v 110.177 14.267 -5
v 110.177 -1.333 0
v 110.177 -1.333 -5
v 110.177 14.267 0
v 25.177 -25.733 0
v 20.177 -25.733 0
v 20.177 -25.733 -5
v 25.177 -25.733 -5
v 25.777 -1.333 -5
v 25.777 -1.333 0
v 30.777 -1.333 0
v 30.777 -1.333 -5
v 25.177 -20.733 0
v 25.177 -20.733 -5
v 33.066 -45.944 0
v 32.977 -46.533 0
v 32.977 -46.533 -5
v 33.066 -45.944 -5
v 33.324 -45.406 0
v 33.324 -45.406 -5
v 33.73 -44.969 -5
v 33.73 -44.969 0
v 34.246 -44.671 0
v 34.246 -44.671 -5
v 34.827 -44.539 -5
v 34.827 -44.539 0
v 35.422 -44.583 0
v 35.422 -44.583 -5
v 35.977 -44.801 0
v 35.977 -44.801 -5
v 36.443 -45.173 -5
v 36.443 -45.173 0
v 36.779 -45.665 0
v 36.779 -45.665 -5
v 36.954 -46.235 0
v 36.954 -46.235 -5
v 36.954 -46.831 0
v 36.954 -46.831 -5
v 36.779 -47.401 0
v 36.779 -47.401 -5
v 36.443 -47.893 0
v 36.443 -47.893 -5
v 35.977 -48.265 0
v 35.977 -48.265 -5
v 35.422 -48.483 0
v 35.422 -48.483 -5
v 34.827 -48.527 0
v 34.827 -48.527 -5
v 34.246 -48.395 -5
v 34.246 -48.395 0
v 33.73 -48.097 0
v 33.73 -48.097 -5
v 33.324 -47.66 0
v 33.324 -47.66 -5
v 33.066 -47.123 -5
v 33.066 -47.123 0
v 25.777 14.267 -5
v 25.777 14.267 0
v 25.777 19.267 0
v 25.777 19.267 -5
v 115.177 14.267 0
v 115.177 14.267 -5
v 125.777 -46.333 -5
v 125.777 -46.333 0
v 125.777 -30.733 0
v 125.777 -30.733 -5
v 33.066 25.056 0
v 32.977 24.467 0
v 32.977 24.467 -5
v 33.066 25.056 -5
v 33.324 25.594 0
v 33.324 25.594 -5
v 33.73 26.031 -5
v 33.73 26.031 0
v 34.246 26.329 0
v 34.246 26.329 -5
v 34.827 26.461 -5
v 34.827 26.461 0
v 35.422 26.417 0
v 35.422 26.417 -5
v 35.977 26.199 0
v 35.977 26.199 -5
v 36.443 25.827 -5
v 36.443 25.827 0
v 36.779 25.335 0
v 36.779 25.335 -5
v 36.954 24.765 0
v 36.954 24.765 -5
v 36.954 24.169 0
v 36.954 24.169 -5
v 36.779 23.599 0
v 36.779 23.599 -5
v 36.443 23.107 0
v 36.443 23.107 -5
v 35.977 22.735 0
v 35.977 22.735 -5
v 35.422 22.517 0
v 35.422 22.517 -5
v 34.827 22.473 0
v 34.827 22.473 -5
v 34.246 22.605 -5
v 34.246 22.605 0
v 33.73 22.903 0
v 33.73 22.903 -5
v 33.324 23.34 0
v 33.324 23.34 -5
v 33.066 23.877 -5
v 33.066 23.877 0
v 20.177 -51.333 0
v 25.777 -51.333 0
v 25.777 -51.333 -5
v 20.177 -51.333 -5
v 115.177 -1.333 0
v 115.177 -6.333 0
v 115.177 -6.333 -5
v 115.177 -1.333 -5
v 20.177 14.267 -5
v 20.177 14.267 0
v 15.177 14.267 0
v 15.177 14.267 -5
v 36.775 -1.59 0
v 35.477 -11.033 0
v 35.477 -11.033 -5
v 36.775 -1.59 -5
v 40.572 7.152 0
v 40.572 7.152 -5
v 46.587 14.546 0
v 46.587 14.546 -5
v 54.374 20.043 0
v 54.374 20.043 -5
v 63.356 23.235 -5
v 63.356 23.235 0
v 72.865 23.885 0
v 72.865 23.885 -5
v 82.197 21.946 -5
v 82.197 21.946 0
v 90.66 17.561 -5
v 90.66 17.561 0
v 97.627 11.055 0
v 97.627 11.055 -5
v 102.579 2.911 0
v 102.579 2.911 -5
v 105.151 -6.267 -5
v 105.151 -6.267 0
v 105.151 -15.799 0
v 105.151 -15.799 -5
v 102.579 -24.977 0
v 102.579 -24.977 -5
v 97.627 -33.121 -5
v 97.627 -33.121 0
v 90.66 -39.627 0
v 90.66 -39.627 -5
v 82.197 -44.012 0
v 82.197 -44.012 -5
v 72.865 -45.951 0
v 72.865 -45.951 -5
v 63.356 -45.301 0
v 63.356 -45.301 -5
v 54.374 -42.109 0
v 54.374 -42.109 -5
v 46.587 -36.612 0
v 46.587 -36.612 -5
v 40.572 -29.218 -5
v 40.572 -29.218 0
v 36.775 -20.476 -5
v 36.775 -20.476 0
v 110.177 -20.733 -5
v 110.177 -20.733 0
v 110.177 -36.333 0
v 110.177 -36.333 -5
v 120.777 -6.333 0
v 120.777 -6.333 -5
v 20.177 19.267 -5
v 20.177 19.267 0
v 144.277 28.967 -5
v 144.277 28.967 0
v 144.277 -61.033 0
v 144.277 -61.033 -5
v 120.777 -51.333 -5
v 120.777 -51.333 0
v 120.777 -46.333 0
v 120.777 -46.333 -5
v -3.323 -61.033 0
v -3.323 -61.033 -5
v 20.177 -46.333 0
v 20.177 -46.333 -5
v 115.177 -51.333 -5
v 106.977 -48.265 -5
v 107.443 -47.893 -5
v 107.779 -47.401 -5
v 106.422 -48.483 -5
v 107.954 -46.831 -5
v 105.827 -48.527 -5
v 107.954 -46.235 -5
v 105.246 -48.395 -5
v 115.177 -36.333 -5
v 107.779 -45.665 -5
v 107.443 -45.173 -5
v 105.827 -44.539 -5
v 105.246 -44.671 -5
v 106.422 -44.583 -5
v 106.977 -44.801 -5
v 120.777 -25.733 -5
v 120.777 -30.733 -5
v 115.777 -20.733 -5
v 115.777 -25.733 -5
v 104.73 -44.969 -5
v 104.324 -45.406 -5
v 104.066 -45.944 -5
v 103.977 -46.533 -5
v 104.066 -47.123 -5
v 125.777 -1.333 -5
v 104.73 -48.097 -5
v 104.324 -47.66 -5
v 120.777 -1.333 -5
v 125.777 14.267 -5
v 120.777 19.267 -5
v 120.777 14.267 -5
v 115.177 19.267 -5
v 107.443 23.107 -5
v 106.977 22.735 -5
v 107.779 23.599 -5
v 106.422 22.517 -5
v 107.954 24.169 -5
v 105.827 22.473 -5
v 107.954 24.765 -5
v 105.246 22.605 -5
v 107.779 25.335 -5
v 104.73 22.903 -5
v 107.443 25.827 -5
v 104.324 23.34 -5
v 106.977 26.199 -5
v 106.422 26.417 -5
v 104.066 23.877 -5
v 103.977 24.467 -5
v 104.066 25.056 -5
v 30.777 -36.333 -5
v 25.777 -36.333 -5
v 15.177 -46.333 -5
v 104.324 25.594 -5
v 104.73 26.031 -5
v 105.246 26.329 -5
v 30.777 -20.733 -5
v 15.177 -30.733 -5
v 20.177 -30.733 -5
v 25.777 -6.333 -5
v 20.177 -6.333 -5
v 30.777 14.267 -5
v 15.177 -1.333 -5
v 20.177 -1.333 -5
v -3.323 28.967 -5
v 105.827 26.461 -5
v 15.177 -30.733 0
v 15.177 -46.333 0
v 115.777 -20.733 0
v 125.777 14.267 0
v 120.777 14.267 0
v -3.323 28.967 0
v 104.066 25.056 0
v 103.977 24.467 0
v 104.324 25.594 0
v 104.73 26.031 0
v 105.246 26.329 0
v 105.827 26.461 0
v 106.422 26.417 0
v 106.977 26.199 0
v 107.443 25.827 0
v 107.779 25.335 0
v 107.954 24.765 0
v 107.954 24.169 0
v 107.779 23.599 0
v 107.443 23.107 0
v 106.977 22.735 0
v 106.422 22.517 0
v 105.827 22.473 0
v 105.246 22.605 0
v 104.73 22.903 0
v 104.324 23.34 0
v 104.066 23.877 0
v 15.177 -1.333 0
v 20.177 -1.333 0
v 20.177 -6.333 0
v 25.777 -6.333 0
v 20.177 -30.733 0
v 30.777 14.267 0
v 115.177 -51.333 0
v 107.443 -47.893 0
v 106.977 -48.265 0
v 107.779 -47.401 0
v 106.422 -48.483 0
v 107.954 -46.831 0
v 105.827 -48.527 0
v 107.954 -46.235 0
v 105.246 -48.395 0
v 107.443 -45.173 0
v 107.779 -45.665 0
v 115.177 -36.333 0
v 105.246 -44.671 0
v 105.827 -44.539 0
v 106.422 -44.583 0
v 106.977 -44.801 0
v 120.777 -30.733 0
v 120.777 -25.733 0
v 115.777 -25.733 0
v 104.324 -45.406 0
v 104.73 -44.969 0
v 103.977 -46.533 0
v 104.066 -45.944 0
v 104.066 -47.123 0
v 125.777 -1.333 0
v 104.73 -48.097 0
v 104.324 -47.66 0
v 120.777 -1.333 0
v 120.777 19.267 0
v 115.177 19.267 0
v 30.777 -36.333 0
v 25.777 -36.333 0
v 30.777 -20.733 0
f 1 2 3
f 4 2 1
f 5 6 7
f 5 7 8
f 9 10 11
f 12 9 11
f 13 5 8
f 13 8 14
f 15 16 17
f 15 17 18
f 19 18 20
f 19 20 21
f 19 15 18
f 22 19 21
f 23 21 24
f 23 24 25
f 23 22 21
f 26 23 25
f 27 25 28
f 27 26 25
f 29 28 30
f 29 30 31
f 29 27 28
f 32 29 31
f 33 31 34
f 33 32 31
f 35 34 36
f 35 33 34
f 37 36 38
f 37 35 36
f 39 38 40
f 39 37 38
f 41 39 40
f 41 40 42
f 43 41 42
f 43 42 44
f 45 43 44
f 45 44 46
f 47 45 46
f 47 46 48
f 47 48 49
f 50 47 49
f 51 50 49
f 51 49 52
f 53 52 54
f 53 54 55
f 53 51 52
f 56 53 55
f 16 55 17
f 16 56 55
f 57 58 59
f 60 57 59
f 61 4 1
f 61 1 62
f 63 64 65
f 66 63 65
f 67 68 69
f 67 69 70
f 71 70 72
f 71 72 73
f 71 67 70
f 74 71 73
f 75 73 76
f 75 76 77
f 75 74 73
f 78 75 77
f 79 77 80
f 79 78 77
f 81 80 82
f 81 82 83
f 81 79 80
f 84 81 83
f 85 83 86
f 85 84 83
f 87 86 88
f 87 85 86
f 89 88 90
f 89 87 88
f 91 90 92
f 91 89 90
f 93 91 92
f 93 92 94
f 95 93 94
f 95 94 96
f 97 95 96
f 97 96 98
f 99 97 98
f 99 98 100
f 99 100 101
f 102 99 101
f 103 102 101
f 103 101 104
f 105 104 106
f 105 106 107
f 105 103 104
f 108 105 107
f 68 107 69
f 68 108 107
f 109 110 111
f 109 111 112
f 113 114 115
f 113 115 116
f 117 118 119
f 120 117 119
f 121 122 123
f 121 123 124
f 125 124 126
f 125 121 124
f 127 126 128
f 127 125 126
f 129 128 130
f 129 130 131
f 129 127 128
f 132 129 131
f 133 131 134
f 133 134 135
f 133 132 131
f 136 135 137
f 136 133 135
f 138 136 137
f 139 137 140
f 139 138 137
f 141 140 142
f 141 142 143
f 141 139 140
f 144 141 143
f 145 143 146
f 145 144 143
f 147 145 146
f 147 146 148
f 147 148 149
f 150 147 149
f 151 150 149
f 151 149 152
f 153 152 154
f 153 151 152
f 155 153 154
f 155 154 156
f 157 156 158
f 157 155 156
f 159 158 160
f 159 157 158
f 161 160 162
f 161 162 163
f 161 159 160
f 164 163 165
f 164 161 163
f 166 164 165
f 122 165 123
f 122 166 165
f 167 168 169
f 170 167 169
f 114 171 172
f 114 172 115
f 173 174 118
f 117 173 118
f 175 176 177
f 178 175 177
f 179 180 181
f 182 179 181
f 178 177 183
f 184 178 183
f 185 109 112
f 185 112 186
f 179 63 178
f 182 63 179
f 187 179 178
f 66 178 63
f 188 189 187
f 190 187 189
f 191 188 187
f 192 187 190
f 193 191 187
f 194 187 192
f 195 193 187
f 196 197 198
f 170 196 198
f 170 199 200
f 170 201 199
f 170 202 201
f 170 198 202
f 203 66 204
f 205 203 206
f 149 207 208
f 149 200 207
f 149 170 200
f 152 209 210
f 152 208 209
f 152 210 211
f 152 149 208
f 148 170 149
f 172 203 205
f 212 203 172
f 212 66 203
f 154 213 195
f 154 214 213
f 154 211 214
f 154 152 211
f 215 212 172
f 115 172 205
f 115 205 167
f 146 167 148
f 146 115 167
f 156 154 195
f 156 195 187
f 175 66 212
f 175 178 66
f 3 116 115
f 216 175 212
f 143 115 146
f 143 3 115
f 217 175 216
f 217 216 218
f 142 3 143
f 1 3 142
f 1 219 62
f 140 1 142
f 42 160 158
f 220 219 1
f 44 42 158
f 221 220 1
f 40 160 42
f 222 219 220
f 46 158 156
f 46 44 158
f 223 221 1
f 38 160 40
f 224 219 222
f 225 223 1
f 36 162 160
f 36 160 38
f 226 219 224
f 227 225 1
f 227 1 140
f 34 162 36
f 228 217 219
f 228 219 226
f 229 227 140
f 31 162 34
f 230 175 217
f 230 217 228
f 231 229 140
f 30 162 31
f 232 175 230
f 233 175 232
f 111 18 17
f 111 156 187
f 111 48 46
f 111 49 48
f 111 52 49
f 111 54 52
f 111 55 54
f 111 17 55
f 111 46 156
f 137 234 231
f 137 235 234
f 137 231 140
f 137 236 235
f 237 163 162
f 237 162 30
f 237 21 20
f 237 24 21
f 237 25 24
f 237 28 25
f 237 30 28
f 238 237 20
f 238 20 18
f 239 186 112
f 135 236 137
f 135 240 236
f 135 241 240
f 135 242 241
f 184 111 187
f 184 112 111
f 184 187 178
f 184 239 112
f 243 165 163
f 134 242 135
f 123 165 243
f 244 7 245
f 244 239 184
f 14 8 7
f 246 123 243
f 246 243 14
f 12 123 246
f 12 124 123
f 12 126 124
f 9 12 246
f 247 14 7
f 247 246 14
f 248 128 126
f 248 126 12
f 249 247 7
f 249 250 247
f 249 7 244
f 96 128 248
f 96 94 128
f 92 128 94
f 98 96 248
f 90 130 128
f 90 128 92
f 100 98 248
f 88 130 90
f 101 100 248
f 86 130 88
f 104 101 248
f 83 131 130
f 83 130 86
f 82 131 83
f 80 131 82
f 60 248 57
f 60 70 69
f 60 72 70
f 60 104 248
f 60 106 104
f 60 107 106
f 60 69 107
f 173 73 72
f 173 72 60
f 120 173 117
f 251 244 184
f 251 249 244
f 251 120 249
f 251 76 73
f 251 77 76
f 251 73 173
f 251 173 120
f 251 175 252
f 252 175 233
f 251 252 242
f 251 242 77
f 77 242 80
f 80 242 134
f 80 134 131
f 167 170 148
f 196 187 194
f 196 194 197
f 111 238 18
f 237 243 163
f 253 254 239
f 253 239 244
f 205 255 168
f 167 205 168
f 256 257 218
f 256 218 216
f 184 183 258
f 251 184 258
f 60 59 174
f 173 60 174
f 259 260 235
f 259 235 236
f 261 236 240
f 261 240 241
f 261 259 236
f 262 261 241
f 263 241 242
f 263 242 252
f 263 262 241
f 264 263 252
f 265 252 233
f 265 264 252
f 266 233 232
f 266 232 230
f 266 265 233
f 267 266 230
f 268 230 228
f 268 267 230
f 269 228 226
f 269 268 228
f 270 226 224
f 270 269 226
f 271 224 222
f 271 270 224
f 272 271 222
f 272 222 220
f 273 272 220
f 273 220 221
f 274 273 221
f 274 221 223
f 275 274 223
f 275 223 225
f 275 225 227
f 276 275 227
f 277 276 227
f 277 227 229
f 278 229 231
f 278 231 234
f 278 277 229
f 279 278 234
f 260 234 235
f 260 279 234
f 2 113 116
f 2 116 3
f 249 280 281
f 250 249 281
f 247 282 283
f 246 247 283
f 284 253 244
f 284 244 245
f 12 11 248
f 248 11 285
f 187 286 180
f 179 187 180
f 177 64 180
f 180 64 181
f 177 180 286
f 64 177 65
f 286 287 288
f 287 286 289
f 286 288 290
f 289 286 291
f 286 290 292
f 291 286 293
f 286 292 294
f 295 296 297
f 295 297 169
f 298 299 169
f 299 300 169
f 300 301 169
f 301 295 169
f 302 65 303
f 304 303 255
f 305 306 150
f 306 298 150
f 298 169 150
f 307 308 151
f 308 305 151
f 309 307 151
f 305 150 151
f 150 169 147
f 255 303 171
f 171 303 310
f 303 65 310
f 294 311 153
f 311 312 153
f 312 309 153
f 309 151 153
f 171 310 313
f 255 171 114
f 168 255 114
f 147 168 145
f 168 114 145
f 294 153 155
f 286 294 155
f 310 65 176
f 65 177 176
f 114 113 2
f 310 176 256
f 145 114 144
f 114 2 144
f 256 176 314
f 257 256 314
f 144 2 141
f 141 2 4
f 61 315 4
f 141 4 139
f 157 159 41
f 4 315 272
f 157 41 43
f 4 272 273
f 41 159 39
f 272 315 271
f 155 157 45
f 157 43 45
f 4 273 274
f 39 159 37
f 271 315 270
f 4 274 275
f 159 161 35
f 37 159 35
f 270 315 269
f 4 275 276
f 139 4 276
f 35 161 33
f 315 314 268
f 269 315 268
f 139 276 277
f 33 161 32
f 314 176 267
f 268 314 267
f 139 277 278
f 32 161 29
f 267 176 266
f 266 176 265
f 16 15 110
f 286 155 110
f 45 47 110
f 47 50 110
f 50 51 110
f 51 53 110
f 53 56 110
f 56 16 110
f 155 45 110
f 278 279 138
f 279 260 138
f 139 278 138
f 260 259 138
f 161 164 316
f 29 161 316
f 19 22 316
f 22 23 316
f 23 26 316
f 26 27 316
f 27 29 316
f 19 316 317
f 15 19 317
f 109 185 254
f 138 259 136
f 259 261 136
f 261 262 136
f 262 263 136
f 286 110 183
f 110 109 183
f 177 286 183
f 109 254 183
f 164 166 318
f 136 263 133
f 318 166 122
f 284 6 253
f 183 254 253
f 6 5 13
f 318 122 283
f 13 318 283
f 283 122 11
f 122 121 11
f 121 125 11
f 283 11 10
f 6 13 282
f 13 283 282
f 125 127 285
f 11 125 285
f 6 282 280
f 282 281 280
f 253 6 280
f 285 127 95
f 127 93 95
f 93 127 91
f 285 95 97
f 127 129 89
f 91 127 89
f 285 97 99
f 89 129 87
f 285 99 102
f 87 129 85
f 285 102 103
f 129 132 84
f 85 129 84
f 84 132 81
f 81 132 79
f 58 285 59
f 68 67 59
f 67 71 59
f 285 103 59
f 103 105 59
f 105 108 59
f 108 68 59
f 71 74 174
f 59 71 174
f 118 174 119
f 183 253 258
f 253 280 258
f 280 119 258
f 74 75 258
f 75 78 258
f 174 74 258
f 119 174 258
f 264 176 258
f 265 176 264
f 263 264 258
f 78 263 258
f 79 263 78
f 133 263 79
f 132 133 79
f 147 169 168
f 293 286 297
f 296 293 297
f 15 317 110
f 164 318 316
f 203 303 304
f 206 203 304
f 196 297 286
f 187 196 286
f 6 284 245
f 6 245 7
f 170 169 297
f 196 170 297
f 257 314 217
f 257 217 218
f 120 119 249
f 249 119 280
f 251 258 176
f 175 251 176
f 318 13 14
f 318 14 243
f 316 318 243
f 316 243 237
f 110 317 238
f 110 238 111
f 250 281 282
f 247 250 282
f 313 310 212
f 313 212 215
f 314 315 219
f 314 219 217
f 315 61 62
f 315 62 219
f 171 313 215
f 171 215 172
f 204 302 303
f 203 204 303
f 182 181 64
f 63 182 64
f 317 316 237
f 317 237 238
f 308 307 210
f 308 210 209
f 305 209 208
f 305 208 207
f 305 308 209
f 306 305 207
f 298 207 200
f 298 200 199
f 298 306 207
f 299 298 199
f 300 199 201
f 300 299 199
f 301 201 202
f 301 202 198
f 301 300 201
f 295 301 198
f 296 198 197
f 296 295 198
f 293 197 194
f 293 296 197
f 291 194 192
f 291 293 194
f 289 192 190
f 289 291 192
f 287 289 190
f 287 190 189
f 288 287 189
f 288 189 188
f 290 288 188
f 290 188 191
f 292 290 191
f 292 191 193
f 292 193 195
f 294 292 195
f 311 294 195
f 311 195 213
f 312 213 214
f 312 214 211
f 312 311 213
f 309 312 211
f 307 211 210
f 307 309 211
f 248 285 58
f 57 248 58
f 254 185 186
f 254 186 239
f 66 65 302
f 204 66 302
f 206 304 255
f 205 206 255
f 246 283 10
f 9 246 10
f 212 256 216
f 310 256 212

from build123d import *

# Parameters (mm, degrees)
SKETCH2_R           = 35
SKETCH2_R_2         = 2
BOSS_EXTRUDE1_DEPTH = 5


with BuildPart() as part:
    # Sketch2 → Boss-Extrude1 (new body)
    with BuildSketch(Plane(origin=(0, 0, 0), x_dir=(-1, 0, 0), z_dir=(0, 0, -1))):
        Polygon((-144.276672243, 28.966950724), (-144.276672243, -46.033049276), (-144.276672243, -61.033049276), (3.323327757, -61.033049276), (3.323327757, -46.033049276), (3.323327757, 28.966950724), align=None)
        with Locations((-70.476672243, -11.033049276)):
            Circle(SKETCH2_R, mode=Mode.SUBTRACT)
        with Locations((-34.976672243, 24.466950724)):
            Circle(SKETCH2_R_2, mode=Mode.SUBTRACT)
        with Locations((-105.976672243, 24.466950724)):
            Circle(SKETCH2_R_2, mode=Mode.SUBTRACT)
        with Locations((-105.976672243, -46.533049276)):
            Circle(SKETCH2_R_2, mode=Mode.SUBTRACT)
        with Locations((-34.976672243, -46.533049276)):
            Circle(SKETCH2_R_2, mode=Mode.SUBTRACT)
        Polygon((-30.776672243, 14.266950724), (-25.776672243, 14.266950724), (-25.776672243, 19.266950724), (-20.176672243, 19.266950724), (-20.176672243, 14.266950724), (-15.176672243, 14.266950724), (-15.176672243, -1.333049276), (-20.176672243, -1.333049276), (-20.176672243, -6.333049276), (-25.776672243, -6.333049276), (-25.776672243, -1.333049276), (-30.776672243, -1.333049276), align=None, mode=Mode.SUBTRACT)
        Polygon((-115.176672243, -6.333049276), (-115.176672243, -1.333049276), (-110.176672243, -1.333049276), (-110.176672243, 14.266950724), (-115.176672243, 14.266950724), (-115.176672243, 19.266950724), (-120.776672243, 19.266950724), (-120.776672243, 14.266950724), (-125.776672243, 14.266950724), (-125.776672243, -1.333049276), (-120.776672243, -1.333049276), (-120.776672243, -6.333049276), align=None, mode=Mode.SUBTRACT)
        Polygon((-120.776672243, -25.733049276), (-115.776672243, -25.733049276), (-115.776672243, -20.733049276), (-110.176672243, -20.733049276), (-110.176672243, -36.333049276), (-115.176672243, -36.333049276), (-115.176672243, -51.333049276), (-120.776672243, -51.333049276), (-120.776672243, -46.333049276), (-125.776672243, -46.333049276), (-125.776672243, -30.733049276), (-120.776672243, -30.733049276), align=None, mode=Mode.SUBTRACT)
        Polygon((-25.776672243, -36.333049276), (-25.776672243, -51.333049276), (-20.176672243, -51.333049276), (-20.176672243, -46.333049276), (-15.176672243, -46.333049276), (-15.176672243, -30.733049276), (-20.176672243, -30.733049276), (-20.176672243, -25.733049276), (-25.176672243, -25.733049276), (-25.176672243, -20.733049276), (-30.776672243, -20.733049276), (-30.776672243, -36.333049276), align=None, mode=Mode.SUBTRACT)
    extrude(amount=BOSS_EXTRUDE1_DEPTH)


solid = part.part
